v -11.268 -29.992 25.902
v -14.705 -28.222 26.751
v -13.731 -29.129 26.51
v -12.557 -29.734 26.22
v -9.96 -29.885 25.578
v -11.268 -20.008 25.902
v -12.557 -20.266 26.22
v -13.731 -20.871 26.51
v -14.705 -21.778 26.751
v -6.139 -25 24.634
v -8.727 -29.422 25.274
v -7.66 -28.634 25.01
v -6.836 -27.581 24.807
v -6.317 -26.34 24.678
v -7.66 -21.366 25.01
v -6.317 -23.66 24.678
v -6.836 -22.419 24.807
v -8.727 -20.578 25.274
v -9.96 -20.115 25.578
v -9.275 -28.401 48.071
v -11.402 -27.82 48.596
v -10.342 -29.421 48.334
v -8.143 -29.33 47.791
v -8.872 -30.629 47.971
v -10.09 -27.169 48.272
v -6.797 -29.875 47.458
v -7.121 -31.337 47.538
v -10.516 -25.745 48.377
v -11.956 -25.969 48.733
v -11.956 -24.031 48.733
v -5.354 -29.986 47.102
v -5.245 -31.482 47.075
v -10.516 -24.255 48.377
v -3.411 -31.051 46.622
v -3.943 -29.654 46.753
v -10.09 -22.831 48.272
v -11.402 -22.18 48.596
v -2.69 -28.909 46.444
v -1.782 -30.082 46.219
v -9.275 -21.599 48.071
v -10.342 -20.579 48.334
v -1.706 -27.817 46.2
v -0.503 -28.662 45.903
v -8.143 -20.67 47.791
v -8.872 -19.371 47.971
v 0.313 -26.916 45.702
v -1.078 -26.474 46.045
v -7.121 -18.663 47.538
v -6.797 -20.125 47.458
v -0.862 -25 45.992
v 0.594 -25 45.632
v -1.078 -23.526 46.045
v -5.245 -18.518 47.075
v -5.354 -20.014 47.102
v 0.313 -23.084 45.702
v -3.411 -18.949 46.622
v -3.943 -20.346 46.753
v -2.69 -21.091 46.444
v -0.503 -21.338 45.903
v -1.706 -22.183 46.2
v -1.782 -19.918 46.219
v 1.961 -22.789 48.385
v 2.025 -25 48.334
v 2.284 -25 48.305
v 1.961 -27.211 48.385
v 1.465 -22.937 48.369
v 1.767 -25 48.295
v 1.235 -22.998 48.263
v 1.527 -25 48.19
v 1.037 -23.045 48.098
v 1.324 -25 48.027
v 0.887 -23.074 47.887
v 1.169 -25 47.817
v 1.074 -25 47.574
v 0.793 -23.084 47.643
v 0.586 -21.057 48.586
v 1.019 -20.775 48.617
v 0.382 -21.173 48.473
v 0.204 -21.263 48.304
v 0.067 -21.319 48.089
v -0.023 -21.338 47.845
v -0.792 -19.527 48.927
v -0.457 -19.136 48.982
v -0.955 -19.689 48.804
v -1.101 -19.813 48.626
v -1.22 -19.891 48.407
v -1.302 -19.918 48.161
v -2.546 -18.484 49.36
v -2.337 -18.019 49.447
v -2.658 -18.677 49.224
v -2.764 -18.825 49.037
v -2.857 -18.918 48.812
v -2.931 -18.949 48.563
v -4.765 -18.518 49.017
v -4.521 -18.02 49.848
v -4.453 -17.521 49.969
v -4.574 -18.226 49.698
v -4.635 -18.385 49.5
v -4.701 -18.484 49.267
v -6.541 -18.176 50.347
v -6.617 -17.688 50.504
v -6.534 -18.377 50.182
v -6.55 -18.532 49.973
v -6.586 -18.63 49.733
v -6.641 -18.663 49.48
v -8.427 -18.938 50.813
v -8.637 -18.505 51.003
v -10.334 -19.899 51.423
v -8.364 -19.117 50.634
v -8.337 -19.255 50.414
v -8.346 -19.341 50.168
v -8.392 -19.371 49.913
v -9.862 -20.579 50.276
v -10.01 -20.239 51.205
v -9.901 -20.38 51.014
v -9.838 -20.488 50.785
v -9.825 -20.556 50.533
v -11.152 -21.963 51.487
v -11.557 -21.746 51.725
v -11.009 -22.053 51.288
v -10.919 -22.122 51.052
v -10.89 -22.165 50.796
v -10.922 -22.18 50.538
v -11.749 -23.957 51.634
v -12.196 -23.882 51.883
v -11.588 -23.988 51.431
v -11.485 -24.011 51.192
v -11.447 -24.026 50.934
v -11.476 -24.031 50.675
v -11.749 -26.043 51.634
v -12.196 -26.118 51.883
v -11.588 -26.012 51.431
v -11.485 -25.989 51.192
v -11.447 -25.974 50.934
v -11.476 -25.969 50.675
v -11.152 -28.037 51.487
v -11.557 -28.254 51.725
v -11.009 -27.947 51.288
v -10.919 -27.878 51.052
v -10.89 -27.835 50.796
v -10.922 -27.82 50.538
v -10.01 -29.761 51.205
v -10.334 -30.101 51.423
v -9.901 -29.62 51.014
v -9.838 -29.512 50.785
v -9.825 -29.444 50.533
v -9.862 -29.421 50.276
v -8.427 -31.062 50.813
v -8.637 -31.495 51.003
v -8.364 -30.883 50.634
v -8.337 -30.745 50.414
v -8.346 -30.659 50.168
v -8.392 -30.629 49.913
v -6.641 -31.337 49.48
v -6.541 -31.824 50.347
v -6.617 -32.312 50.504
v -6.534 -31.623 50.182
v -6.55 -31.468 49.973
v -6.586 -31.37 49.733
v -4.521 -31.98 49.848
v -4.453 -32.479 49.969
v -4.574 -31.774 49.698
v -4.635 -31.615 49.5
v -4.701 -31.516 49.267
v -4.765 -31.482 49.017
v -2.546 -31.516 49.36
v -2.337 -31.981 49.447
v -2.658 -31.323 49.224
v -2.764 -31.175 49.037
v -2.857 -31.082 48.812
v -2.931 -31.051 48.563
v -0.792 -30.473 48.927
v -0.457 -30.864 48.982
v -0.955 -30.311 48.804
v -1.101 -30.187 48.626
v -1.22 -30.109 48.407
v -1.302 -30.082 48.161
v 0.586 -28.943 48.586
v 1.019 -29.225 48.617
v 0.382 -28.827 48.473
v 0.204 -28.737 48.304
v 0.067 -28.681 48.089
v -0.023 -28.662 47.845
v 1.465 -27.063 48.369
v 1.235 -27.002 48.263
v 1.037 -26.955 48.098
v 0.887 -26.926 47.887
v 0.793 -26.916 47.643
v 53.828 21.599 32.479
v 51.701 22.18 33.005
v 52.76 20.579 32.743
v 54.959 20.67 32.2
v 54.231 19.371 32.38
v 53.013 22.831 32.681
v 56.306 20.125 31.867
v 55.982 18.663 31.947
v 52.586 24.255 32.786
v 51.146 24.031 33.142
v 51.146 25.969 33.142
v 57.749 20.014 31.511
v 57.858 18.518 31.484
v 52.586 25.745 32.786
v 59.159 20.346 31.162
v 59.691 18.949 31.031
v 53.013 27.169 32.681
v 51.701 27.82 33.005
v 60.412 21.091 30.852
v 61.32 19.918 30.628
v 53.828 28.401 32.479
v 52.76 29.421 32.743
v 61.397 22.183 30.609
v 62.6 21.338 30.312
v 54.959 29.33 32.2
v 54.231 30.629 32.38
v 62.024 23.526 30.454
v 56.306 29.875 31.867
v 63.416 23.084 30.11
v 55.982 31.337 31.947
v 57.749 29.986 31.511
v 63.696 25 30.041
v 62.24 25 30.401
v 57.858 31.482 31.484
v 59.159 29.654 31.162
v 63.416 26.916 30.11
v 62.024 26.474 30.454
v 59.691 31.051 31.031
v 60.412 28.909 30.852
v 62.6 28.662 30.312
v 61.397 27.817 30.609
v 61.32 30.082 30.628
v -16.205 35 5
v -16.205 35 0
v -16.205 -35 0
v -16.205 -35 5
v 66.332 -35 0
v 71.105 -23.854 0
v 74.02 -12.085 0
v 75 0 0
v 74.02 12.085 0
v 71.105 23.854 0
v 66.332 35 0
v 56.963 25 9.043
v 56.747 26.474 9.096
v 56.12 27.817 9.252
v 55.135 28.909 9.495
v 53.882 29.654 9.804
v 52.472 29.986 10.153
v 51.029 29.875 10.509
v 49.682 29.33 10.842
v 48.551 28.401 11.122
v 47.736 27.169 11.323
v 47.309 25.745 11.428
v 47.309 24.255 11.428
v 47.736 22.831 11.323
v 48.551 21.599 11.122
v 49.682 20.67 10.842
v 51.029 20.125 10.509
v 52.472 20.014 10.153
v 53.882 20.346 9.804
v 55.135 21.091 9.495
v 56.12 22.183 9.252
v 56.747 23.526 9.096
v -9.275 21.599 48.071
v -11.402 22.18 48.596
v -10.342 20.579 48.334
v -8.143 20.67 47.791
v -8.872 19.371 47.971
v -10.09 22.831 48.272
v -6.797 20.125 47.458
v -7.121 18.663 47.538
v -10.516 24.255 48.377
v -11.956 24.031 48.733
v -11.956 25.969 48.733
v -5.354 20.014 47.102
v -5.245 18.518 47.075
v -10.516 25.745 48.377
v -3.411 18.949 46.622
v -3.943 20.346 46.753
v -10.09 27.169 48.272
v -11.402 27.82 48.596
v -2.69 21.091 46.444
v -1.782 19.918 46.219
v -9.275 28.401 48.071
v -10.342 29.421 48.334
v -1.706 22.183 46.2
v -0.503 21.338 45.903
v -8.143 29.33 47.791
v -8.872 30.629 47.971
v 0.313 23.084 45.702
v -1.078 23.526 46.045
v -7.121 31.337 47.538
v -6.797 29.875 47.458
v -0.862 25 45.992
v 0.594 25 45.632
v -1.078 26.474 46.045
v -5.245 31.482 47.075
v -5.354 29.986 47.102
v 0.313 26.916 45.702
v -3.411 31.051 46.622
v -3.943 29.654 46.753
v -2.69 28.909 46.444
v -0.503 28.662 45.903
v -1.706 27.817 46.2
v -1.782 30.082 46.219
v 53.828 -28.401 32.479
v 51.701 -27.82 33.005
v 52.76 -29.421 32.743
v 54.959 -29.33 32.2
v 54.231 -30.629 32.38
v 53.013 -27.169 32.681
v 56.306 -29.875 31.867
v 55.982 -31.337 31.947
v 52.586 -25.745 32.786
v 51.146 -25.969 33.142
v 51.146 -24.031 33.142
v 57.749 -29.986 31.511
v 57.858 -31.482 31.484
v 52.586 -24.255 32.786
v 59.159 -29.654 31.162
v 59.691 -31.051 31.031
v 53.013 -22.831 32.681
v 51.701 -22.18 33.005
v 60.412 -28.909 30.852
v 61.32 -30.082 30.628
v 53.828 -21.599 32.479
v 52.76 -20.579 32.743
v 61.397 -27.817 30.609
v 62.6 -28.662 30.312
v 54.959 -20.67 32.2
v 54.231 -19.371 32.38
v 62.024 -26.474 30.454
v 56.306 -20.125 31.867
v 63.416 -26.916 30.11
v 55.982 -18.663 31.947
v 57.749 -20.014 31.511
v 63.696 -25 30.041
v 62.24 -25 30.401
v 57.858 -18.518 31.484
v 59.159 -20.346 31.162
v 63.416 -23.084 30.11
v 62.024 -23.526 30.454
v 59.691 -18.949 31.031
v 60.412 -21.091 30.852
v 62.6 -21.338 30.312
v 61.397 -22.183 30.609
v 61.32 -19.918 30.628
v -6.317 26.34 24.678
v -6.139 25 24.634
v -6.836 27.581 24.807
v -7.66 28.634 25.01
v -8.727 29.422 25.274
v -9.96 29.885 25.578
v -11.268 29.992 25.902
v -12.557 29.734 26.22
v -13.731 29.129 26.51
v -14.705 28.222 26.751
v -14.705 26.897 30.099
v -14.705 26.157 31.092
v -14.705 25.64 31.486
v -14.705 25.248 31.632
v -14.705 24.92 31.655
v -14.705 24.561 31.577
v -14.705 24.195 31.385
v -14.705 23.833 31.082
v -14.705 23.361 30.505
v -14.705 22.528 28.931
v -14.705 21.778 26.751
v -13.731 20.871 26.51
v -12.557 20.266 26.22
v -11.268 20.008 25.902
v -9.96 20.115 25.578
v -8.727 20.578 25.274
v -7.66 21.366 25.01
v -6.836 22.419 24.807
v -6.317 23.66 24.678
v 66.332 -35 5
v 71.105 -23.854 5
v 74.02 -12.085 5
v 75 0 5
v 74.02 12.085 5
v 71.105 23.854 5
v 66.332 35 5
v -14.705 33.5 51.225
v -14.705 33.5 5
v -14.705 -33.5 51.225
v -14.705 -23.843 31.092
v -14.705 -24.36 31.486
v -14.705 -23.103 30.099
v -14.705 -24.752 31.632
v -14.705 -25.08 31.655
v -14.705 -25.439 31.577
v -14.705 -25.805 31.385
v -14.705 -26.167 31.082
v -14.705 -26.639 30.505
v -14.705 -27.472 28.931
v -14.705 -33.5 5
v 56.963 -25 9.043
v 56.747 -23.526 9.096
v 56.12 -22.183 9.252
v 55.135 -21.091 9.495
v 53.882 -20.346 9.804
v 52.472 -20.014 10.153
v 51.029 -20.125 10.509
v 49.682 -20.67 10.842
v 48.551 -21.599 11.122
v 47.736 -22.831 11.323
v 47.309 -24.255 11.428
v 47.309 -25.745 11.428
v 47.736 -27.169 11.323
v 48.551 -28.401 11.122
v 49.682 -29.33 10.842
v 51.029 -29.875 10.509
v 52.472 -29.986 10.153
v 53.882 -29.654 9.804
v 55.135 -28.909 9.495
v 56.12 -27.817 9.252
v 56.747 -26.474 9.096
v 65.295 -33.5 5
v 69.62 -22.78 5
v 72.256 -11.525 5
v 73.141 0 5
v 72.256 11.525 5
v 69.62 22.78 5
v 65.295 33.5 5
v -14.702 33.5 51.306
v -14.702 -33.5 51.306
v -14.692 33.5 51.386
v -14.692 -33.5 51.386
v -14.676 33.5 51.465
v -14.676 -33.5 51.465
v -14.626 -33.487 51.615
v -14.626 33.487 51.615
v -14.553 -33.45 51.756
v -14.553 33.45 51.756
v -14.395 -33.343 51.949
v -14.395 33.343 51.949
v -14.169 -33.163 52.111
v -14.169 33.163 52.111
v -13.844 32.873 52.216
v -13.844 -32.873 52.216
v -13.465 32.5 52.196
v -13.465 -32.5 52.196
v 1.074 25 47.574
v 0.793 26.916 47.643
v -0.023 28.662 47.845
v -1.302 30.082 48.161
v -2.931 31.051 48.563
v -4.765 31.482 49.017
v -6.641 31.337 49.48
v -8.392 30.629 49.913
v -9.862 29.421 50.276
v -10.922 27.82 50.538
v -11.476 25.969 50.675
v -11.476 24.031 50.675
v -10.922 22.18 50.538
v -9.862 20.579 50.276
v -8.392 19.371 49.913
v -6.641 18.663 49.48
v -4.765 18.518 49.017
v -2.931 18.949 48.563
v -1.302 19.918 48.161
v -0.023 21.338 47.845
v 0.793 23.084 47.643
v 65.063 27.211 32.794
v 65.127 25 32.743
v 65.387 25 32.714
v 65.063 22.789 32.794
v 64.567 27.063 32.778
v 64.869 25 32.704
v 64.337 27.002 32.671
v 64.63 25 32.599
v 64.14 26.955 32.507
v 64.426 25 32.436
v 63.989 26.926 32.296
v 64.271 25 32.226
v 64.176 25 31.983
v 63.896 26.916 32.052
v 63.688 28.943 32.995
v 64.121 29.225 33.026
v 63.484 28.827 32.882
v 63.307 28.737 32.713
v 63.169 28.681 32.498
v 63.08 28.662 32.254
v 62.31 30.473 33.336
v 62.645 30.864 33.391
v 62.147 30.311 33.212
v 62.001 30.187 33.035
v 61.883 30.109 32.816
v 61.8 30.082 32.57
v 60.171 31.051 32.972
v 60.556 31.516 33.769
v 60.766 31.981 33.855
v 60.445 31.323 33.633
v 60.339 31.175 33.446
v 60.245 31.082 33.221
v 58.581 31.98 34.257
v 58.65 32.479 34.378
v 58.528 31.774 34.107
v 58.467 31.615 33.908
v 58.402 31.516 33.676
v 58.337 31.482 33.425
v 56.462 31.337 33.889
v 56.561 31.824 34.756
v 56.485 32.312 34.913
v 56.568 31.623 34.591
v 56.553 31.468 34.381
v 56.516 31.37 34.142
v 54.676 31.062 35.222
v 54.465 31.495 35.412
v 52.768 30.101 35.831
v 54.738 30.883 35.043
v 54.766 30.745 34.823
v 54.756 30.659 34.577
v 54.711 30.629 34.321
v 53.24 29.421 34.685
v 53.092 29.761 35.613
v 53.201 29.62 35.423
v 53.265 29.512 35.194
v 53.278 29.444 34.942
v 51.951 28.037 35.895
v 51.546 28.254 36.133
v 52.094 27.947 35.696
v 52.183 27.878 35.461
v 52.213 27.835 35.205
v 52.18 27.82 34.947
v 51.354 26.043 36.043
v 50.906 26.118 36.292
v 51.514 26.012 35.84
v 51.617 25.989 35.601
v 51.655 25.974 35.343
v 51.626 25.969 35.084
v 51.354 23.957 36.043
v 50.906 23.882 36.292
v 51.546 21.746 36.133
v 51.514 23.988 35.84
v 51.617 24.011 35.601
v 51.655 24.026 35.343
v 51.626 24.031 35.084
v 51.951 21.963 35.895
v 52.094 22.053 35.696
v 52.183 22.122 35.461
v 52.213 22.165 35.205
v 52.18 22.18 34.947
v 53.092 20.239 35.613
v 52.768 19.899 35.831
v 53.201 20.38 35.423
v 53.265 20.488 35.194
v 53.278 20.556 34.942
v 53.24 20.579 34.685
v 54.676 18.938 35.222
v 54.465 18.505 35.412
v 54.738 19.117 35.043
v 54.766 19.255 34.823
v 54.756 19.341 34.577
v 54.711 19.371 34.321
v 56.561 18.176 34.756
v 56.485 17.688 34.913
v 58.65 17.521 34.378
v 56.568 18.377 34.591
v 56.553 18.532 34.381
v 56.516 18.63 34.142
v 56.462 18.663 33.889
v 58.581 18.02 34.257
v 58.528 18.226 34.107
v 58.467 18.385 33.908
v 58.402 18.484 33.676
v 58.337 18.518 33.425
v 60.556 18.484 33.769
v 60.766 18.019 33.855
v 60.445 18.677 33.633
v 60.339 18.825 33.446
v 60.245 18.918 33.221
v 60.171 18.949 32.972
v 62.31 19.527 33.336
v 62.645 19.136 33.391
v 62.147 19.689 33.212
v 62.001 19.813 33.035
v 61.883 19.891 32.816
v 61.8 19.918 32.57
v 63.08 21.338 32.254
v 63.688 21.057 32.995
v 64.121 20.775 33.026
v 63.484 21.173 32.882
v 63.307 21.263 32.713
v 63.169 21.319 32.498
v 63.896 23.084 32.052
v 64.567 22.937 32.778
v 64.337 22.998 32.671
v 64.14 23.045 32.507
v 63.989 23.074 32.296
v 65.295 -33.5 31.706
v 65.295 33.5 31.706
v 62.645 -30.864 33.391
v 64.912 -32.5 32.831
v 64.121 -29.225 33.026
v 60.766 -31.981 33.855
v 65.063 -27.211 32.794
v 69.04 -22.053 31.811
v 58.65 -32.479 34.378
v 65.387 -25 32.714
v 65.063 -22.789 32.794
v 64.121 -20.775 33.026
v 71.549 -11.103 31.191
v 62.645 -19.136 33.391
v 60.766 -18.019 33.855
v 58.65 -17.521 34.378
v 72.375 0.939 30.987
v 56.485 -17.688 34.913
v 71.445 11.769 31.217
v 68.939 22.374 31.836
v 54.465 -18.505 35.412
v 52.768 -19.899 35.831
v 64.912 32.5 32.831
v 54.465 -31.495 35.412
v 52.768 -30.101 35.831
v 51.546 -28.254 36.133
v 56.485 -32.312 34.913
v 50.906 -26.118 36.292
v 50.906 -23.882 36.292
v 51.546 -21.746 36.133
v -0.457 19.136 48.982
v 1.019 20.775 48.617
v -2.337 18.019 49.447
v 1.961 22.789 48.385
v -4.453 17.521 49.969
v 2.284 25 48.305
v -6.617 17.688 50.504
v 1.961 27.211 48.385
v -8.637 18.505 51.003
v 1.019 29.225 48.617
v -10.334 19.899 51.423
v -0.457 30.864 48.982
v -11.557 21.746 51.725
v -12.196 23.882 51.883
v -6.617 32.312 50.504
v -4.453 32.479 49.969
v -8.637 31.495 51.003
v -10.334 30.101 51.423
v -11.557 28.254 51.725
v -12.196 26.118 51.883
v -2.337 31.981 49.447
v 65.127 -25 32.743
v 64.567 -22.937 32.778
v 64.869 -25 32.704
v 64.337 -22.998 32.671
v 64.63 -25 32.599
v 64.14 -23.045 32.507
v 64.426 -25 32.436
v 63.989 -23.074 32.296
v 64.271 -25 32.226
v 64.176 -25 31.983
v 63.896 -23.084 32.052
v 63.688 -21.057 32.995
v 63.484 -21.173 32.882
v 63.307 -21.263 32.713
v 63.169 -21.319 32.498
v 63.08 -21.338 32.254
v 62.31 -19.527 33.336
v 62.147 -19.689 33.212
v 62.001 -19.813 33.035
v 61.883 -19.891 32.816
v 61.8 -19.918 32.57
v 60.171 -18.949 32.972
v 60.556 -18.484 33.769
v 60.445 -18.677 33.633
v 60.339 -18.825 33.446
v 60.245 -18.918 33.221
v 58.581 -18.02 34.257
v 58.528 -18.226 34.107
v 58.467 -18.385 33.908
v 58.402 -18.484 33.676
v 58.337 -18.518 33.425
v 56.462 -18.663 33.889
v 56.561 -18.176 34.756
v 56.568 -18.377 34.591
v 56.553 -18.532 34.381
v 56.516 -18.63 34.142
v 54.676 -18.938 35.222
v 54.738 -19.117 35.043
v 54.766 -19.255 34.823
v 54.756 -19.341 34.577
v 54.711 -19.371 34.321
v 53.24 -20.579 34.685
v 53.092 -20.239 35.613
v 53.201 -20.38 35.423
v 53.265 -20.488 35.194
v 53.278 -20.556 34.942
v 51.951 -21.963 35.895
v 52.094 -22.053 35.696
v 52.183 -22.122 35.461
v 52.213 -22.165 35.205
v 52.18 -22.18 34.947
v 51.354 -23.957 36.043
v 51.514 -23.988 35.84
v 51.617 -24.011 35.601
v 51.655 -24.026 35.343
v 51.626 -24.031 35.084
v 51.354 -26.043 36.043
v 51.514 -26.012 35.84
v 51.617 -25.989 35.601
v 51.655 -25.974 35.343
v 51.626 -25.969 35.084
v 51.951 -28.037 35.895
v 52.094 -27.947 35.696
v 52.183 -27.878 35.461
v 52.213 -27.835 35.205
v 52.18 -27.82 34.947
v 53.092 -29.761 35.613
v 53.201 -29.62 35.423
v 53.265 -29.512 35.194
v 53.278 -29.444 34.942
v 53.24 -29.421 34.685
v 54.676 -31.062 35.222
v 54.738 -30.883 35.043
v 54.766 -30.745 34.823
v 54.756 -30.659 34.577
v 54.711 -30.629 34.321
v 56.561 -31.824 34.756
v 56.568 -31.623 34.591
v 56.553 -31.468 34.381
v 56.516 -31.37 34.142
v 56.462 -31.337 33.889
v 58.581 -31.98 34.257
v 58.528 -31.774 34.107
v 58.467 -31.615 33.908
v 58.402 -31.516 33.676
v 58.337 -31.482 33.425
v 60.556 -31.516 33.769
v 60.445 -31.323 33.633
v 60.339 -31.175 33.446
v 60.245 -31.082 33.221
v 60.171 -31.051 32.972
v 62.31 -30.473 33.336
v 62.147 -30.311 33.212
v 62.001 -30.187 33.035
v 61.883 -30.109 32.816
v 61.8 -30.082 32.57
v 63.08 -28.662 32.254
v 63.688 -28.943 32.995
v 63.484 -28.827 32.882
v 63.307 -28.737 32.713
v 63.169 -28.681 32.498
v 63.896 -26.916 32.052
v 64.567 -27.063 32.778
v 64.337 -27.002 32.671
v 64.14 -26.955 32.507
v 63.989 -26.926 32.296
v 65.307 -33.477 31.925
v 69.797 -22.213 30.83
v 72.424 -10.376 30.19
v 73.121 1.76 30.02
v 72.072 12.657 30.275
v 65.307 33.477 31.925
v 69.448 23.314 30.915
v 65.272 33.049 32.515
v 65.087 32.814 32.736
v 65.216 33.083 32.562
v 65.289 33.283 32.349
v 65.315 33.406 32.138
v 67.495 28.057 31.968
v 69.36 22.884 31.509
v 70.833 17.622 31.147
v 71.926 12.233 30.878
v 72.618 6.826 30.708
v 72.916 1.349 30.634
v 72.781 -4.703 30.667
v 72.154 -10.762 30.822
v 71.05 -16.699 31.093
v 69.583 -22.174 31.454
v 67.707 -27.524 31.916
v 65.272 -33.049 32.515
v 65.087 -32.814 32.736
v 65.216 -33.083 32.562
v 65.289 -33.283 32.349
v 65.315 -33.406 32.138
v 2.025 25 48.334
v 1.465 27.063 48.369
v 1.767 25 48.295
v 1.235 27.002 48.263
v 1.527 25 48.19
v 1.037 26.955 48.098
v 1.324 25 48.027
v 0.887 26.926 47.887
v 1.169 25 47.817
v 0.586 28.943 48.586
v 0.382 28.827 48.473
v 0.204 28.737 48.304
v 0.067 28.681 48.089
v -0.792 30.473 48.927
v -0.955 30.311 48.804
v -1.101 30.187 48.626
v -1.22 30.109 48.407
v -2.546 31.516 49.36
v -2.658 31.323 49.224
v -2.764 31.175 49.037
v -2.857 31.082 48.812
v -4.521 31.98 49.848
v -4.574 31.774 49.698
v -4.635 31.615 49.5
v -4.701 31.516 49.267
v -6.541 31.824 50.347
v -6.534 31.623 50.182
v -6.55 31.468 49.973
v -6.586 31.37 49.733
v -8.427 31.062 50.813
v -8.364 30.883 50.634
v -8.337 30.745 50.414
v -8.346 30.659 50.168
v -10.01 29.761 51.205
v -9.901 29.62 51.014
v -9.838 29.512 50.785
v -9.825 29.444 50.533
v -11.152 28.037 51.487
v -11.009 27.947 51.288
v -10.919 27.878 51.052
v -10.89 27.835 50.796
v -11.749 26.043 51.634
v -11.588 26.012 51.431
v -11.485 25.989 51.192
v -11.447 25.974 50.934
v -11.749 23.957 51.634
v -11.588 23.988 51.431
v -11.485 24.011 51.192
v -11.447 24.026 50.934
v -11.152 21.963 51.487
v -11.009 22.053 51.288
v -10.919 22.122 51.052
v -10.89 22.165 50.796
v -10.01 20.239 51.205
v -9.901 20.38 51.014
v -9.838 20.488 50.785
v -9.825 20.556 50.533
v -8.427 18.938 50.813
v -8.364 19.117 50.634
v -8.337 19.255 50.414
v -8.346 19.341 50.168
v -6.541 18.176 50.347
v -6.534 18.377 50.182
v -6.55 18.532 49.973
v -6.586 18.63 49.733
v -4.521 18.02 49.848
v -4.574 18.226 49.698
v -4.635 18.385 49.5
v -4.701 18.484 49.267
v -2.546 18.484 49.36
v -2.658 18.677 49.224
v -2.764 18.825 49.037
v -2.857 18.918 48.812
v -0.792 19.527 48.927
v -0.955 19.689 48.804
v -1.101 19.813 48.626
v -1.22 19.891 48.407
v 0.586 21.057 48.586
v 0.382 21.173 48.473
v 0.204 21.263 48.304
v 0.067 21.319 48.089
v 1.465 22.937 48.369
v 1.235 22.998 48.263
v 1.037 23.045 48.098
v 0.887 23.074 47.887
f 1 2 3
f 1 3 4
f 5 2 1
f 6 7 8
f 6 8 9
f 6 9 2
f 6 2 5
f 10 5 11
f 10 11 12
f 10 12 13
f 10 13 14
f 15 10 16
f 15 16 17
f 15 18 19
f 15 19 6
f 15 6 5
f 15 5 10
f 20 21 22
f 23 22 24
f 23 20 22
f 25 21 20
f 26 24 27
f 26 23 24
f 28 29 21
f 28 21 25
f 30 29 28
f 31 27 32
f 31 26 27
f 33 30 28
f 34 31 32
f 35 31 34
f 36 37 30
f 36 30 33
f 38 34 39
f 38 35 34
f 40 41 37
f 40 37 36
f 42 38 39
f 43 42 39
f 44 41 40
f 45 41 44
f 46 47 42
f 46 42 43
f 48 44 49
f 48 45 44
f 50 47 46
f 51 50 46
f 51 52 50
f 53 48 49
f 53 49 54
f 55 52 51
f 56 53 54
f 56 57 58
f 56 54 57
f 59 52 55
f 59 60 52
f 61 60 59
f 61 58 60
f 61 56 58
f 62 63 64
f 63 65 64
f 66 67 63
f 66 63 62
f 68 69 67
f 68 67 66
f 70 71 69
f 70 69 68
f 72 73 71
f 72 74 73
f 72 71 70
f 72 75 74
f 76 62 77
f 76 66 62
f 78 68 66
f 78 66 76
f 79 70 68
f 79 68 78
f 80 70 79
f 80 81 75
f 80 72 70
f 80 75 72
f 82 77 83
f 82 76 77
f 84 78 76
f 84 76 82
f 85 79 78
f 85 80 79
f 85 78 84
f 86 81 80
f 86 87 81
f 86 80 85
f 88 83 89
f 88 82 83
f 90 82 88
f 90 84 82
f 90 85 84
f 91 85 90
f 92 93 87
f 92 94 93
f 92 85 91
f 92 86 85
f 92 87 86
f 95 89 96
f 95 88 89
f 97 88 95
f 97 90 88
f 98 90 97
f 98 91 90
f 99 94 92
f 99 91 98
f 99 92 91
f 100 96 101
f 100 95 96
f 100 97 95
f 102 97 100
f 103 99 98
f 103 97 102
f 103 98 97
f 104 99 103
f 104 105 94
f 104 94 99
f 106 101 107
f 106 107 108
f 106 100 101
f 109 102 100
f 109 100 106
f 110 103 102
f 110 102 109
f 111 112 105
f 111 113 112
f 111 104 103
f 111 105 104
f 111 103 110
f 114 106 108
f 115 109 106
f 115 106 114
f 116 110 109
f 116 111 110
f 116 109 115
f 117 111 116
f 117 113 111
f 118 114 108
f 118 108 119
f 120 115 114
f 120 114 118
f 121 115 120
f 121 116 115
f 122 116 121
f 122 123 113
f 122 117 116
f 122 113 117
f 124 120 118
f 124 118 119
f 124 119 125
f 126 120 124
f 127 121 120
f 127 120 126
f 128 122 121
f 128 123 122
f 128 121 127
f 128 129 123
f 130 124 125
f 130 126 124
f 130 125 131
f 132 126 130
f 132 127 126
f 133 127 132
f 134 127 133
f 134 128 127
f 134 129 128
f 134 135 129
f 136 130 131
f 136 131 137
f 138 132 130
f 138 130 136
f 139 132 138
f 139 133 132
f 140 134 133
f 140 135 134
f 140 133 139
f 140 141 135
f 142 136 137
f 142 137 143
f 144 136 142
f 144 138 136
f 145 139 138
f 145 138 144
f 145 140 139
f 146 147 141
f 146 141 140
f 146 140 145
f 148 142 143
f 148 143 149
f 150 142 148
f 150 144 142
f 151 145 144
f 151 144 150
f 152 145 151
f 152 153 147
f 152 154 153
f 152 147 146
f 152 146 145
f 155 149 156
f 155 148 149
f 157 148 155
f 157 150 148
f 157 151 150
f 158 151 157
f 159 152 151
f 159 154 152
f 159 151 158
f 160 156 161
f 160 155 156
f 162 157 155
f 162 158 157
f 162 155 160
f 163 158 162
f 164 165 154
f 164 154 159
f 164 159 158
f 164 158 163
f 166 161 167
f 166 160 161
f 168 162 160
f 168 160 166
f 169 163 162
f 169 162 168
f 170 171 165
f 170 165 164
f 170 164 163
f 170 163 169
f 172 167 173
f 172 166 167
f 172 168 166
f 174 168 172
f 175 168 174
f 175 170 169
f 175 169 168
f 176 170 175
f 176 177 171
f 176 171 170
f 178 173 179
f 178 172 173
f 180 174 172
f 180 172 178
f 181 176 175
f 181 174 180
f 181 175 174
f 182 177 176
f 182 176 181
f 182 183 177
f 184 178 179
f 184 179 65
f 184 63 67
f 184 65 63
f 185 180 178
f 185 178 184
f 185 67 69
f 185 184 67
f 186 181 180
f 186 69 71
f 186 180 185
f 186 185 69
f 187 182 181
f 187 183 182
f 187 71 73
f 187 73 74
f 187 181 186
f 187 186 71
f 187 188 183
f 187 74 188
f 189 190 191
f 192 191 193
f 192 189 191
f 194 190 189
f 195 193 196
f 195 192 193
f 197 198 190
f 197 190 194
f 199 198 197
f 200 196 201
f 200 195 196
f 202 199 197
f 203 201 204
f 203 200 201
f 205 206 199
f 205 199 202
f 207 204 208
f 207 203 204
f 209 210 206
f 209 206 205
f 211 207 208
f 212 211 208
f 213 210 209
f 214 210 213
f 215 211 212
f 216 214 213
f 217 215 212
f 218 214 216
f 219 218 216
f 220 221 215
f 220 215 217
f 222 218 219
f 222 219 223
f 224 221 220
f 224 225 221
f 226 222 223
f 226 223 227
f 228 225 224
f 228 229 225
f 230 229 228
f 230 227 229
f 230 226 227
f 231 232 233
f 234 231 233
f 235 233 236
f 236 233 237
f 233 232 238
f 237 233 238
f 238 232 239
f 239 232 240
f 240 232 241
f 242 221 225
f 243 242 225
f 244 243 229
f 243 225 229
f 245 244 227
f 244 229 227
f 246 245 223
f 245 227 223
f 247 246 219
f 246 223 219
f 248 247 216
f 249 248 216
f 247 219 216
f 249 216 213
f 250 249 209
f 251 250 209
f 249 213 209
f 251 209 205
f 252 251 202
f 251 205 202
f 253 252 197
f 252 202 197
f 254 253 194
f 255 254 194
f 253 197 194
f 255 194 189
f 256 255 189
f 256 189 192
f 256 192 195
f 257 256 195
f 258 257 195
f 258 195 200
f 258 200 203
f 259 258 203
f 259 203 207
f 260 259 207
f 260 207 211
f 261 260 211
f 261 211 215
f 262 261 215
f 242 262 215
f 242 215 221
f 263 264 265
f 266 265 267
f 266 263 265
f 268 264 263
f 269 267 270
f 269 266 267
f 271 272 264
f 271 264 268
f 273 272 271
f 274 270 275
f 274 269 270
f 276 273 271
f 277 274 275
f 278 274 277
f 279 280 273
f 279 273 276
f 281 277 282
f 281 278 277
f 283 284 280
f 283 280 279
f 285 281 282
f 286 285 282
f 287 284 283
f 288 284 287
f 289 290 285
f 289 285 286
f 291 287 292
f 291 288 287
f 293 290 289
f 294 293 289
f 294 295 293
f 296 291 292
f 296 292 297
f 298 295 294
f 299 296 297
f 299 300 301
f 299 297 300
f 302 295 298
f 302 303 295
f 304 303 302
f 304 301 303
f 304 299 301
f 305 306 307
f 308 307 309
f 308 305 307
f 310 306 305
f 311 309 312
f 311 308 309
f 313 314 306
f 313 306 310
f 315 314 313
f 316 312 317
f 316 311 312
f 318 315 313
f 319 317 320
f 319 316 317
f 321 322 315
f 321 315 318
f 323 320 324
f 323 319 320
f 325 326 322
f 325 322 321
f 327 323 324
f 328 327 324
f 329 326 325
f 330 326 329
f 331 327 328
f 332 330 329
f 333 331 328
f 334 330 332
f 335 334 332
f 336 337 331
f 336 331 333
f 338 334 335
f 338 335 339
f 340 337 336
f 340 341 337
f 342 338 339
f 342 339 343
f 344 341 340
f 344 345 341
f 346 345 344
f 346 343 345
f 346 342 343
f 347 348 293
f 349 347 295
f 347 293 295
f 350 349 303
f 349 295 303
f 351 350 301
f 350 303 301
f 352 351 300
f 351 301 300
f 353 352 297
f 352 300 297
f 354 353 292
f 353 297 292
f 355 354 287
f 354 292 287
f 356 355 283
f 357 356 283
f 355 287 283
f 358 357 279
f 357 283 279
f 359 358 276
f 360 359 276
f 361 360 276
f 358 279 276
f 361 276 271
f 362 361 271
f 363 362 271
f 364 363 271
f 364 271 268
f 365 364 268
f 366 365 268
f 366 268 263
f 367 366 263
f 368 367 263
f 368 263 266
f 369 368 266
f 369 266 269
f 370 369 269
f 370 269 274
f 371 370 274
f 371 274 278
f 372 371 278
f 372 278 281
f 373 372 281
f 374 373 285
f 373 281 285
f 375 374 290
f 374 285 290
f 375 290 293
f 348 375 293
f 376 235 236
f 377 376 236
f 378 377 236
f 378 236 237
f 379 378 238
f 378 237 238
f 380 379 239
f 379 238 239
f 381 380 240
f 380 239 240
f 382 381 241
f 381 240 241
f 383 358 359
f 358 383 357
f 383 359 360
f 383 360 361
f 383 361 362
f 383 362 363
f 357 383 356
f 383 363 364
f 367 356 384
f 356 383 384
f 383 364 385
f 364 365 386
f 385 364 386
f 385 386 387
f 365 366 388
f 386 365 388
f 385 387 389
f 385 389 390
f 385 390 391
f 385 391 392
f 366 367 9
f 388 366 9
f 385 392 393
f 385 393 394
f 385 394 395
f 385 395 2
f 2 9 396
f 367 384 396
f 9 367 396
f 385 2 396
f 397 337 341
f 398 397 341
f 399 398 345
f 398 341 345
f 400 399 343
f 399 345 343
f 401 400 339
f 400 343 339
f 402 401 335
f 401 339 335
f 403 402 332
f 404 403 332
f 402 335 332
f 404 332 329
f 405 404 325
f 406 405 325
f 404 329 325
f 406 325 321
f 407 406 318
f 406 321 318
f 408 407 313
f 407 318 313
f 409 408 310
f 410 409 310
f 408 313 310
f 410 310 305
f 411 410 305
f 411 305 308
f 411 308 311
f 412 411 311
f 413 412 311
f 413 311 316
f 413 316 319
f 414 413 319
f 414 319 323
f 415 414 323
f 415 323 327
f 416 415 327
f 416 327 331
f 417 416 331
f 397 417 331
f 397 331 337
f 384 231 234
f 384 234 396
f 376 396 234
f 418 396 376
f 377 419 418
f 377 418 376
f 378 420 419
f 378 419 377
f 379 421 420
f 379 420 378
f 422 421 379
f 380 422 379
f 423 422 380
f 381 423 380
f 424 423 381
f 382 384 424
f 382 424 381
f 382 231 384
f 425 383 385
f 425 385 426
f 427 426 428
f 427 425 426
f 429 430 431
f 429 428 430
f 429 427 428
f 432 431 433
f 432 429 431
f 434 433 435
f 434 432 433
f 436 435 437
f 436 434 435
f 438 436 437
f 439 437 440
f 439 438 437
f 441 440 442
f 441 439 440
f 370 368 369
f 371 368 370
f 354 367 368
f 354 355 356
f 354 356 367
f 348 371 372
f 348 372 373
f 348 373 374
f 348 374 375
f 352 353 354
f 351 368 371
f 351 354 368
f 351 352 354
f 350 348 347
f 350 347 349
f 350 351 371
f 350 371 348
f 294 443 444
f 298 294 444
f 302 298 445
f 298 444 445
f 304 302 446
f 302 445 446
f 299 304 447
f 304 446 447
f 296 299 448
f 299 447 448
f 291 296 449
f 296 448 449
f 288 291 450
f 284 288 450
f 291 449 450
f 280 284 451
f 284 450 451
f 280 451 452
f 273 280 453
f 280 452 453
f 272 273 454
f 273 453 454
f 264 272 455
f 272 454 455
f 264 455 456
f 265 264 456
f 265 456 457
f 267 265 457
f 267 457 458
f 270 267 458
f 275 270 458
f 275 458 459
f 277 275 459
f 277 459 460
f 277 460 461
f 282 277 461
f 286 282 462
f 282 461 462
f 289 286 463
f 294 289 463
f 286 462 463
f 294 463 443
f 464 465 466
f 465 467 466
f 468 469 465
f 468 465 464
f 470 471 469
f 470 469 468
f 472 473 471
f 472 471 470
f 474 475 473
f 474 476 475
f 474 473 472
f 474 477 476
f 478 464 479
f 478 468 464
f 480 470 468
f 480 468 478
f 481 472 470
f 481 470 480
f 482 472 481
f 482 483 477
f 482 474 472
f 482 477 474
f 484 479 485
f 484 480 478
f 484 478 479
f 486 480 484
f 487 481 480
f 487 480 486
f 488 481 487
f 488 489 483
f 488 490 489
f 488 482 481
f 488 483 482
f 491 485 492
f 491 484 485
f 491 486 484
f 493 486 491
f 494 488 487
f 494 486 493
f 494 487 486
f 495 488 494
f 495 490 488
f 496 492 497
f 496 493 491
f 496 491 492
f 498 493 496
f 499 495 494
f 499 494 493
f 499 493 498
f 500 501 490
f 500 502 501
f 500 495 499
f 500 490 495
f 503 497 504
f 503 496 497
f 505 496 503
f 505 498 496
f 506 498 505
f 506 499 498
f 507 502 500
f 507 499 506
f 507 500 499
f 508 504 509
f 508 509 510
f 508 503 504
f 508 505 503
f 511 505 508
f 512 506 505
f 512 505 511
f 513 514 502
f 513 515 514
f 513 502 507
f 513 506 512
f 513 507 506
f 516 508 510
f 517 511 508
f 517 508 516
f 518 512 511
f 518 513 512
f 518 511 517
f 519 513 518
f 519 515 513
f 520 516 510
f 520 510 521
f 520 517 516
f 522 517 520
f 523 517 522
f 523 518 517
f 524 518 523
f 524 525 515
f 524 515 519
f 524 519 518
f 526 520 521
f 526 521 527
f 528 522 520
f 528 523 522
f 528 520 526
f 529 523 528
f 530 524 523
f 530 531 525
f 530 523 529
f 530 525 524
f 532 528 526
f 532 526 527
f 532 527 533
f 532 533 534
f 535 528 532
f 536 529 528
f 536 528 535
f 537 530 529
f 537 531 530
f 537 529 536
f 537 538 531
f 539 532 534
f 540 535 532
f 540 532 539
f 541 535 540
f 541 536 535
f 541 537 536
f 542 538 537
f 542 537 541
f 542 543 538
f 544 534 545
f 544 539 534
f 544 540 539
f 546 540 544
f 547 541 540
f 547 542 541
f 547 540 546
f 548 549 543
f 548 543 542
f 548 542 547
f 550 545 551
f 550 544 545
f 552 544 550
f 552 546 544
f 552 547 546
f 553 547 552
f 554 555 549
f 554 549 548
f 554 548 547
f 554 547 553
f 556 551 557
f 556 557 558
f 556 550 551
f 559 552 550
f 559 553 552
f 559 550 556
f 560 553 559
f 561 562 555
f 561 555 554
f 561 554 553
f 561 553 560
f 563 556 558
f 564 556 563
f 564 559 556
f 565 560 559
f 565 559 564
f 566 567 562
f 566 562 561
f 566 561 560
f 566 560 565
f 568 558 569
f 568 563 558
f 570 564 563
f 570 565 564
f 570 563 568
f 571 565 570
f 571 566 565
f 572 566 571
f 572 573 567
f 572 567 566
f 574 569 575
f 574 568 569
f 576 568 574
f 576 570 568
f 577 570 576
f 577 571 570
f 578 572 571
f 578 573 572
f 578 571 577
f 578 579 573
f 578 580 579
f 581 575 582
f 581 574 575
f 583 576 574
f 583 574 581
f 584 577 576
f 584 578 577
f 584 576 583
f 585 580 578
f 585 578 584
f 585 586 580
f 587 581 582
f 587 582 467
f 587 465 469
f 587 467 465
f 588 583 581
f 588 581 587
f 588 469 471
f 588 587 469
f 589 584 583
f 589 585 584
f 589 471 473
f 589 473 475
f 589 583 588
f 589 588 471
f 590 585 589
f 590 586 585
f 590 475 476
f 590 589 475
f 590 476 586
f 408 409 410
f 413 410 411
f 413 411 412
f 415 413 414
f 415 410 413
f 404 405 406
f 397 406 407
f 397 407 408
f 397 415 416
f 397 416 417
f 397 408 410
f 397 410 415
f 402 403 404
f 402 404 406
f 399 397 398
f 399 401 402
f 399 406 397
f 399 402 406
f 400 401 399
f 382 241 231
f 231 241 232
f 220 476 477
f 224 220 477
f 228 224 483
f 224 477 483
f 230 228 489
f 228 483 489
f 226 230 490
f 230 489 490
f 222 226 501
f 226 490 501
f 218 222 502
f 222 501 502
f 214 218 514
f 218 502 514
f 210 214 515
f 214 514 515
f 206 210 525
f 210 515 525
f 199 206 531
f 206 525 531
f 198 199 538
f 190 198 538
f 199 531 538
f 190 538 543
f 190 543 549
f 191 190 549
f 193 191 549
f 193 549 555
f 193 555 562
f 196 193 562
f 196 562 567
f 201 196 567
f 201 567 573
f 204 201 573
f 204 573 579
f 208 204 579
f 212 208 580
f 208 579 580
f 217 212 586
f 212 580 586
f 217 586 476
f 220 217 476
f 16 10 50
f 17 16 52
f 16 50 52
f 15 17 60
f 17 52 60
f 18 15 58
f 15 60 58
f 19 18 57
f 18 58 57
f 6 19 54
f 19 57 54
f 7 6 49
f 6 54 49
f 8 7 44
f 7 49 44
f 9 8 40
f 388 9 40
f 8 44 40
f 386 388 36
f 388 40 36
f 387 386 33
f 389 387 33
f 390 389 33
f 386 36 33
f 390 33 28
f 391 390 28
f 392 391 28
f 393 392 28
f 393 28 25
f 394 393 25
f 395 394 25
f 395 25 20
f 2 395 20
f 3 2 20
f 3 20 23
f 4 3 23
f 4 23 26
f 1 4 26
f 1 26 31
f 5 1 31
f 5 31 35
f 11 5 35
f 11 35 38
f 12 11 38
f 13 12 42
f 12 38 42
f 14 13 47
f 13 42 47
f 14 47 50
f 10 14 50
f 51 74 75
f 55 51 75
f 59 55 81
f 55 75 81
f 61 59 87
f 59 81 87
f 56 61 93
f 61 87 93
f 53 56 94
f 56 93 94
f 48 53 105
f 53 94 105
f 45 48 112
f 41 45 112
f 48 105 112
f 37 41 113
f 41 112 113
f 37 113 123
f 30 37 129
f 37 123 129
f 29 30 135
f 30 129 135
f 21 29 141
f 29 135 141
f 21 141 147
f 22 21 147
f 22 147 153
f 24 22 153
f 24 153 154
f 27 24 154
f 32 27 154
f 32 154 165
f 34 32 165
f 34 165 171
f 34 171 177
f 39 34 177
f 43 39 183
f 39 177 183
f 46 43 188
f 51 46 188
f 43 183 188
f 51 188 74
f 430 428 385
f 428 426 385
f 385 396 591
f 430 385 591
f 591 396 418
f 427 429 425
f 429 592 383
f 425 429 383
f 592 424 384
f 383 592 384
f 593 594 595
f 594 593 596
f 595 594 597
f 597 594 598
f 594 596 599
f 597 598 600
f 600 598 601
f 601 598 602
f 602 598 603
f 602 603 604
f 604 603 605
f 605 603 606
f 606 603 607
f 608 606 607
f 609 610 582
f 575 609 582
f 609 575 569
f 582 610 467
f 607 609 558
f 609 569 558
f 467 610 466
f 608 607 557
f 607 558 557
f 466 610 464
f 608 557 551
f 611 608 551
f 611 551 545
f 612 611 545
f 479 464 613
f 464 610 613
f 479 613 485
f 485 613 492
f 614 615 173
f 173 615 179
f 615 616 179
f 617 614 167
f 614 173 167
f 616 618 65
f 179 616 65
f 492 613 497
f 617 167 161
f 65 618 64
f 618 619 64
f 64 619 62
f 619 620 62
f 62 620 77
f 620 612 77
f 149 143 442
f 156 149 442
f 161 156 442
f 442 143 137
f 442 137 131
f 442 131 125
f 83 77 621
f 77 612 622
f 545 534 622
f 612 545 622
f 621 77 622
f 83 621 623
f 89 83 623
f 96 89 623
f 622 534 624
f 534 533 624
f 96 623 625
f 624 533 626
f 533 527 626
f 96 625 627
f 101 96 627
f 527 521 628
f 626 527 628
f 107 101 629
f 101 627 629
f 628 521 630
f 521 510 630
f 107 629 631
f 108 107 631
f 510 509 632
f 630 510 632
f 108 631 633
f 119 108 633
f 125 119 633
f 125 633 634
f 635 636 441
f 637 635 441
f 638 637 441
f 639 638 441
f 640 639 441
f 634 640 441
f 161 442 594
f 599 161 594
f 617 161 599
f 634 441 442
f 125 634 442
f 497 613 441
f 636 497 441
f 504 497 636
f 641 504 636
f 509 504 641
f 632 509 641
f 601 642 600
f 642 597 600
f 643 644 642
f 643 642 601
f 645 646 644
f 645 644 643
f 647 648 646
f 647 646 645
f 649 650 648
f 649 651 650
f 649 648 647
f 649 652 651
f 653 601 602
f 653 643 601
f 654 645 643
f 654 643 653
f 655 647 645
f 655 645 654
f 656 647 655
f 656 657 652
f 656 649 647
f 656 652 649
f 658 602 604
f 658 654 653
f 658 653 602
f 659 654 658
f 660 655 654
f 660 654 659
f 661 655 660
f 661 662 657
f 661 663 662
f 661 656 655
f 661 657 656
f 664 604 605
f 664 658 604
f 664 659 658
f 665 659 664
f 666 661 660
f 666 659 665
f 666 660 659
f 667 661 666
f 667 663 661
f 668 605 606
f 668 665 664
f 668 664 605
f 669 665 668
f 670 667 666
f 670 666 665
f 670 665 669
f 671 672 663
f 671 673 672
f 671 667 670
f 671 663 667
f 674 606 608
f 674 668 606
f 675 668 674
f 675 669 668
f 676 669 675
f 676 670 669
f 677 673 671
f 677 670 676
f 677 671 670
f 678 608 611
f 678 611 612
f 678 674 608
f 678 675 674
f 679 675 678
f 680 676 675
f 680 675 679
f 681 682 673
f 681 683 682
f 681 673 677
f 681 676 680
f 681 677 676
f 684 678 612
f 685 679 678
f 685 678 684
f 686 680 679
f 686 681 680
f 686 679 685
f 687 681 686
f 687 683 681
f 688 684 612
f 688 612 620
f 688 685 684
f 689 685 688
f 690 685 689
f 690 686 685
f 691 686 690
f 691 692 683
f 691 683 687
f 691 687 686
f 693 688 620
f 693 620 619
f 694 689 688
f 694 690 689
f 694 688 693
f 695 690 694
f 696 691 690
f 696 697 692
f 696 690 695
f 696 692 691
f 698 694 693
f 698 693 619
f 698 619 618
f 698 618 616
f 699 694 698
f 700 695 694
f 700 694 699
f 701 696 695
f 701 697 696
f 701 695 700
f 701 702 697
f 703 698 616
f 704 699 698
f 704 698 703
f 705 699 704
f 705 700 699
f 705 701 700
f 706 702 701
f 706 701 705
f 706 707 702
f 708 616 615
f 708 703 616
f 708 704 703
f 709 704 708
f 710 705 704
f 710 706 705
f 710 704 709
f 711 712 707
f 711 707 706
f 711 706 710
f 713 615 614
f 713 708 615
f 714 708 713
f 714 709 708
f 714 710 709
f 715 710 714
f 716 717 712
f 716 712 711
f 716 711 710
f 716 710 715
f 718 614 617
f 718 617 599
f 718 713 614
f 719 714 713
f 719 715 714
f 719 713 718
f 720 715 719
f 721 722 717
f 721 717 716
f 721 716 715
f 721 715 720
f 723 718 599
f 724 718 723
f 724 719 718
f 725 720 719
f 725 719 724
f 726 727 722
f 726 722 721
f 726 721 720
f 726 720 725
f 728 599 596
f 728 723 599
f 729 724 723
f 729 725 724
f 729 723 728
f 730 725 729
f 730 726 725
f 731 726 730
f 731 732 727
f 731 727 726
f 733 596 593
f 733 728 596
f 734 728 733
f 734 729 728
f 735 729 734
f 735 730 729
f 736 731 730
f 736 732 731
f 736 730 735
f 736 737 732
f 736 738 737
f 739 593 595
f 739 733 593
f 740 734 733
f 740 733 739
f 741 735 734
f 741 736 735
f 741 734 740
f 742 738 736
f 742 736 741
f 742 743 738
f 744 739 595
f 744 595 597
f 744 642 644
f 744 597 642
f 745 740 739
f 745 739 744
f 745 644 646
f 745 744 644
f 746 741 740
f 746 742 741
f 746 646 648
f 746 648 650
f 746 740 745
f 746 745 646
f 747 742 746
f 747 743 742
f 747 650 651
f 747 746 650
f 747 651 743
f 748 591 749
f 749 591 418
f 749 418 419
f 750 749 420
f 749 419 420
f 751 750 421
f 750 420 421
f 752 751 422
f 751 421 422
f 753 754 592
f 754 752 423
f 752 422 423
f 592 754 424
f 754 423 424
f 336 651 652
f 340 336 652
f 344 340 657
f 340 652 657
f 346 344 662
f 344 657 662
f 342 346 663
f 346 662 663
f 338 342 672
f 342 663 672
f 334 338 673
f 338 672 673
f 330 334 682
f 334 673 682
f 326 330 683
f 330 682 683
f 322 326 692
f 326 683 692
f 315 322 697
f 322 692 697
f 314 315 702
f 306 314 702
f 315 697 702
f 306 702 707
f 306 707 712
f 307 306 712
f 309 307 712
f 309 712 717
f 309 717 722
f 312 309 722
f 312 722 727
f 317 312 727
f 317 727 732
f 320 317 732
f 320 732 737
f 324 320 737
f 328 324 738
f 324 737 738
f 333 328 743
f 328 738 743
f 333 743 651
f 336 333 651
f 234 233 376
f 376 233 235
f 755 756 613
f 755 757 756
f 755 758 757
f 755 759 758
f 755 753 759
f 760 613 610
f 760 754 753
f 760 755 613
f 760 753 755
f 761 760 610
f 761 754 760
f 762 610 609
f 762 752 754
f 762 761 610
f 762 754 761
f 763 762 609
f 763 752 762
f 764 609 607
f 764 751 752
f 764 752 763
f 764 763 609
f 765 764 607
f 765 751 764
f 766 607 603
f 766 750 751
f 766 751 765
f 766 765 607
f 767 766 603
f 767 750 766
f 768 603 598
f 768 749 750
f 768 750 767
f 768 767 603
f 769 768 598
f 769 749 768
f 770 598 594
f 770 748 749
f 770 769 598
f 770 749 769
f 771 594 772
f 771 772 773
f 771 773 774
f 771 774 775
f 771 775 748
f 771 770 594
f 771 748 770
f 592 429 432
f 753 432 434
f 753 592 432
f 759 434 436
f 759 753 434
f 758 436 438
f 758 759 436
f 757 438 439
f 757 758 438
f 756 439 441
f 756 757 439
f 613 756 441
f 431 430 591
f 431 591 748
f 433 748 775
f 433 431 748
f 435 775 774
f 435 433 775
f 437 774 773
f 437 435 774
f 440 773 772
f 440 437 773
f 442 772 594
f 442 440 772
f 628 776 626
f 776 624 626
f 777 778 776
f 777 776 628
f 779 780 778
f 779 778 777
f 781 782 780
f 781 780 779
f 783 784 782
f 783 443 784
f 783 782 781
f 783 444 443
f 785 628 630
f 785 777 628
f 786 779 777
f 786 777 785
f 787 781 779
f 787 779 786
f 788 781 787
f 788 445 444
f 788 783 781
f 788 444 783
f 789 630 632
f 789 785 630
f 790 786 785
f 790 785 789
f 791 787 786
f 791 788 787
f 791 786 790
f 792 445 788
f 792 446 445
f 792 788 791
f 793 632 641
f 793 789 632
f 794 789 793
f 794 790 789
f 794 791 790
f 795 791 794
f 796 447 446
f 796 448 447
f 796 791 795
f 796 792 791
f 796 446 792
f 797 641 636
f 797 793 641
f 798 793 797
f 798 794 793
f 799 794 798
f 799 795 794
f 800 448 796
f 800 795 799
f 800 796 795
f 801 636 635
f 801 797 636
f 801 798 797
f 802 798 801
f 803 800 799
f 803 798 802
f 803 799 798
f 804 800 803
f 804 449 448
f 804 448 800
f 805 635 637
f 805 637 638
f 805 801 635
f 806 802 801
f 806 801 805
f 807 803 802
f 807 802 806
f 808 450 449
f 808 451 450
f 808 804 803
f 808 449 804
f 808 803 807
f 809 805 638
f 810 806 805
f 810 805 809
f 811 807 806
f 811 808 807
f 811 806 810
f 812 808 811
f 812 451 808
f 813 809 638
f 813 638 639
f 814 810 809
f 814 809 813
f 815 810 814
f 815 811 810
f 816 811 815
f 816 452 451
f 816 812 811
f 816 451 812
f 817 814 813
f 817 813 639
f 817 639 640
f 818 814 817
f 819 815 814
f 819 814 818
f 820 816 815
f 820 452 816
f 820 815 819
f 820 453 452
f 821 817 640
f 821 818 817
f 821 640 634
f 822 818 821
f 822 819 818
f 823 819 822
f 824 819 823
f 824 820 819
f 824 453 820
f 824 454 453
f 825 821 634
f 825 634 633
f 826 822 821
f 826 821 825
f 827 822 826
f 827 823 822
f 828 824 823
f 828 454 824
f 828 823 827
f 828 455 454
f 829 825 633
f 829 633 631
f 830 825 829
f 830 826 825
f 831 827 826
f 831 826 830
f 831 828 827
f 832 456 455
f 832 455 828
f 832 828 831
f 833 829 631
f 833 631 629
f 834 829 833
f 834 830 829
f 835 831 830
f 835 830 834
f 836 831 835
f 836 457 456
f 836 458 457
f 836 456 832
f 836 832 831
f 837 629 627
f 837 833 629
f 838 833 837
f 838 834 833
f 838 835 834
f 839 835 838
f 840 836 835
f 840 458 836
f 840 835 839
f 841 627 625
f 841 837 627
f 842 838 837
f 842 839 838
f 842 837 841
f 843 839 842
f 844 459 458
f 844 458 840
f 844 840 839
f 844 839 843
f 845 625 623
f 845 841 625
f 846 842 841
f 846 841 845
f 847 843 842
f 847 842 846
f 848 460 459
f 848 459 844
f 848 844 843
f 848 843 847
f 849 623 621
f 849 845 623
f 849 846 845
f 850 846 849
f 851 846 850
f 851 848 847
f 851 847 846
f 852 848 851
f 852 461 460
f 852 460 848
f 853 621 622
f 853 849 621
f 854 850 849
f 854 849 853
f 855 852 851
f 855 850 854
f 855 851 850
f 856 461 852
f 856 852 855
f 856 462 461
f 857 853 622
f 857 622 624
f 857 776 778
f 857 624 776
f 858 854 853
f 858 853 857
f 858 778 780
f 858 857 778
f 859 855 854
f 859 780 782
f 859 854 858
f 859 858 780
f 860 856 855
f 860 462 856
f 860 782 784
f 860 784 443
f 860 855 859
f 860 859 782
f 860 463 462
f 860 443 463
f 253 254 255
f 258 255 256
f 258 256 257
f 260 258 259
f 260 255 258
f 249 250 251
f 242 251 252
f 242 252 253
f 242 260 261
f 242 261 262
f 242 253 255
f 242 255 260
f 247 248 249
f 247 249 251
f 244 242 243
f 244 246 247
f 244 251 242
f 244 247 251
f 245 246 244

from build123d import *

# Parameters (mm, degrees)
BOSS_EXTRUDE1_DEPTH = 5
BOSS_EXTRUDE2_REACH = 84.916
SKETCH3_R           = 5
CUT_EXTRUDE1_DEPTH  = 25
SKETCH4_R           = 6.5
CUT_EXTRUDE2_DEPTH  = 3
FILLET1_R           = 1


with BuildPart() as part:
    # Sketch1 → Boss-Extrude1 (new body)
    with BuildSketch(Plane.XY):
        with BuildLine():
            Line((-16.204881352, 35), (-16.204881352, -35))
            Line((-16.204881352, -35), (66.332495807, -35))
            ThreePointArc((66.332495807, -35), (75, 0), (66.332495807, 35))
            Line((66.332495807, 35), (-16.204881352, 35))
        make_face()
    extrude(amount=BOSS_EXTRUDE1_DEPTH)

    # Boss-Extrude2: up to this plane
    boss_extrude2_end = Plane(origin=(7.525658293, -40, 47.009794297), z_dir=(-0.239863978039186, 0, -0.9708065059728519))
    # Sketch2 → Boss-Extrude2 (add, up to the surface)
    with BuildSketch(Plane.XY.offset(5), mode=Mode.PRIVATE) as boss_extrude2_sk1:
        with BuildLine():
            Line((65.295118648, 33.5), (-14.704881352, 33.5))
            Line((-14.704881352, 33.5), (-14.704881352, -33.5))
            Line((-14.704881352, -33.5), (65.295118648, -33.5))
            ThreePointArc((65.295118648, -33.5), (73.141235595, 0), (65.295118648, 33.5))
        make_face()
    boss_extrude2_tool1 = split(extrude(boss_extrude2_sk1.sketch, amount=BOSS_EXTRUDE2_REACH, mode=Mode.PRIVATE), bisect_by=boss_extrude2_end, keep=Keep.BOTH, mode=Mode.PRIVATE)
    add(boss_extrude2_tool1.solids().sort_by_distance((27.970522, 0, 5))[0])

    # Sketch3 → Cut-Extrude1 (cut)
    with BuildSketch(Plane(origin=(11.379758408, 0, 46.057534728), x_dir=(0.970806505972852, 0, -0.23986397803918558), z_dir=(0.2398639780391856, 0, 0.9708065059728521))):
        with Locations((-16.869040946, 25)):
            Circle(SKETCH3_R)
        with Locations((-16.869040946, -25)):
            Circle(SKETCH3_R)
        with Locations((48.130959054, -25)):
            Circle(SKETCH3_R)
        with Locations((48.130959054, 25)):
            Circle(SKETCH3_R)
    extrude(amount=-CUT_EXTRUDE1_DEPTH, mode=Mode.SUBTRACT)

    # Sketch4 → Cut-Extrude2 (cut)
    with BuildSketch(Plane(origin=(11.379758408, 0, 46.057534728), x_dir=(0.970806505972852, 0, -0.23986397803918558), z_dir=(0.2398639780391856, 0, 0.9708065059728521))):
        with Locations((-16.869040946, 25)):
            Circle(SKETCH4_R)
        with Locations((-16.869040946, -25)):
            Circle(SKETCH4_R)
        with Locations((48.130959054, -25)):
            Circle(SKETCH4_R)
        with Locations((48.130959054, 25)):
            Circle(SKETCH4_R)
    extrude(amount=-CUT_EXTRUDE2_DEPTH, mode=Mode.SUBTRACT)

    # Fillet1
    fillet1_edges = [part.edges().sort_by_distance(p)[0] for p in [
        (25.295118648, -33.5, 42.619368994),
        (-14.704881352, 0, 52.502449775),
        (25.295118648, 33.5, 42.619368994),
        (73.141235595, 0, 30.797693023),
        (-11.307058581, 25, 51.662925852),
        (51.795364307, 25, 36.07176728),
        (51.795364307, -25, 36.07176728),
        (-11.307058581, -25, 51.662925852),
    ]]
    fillet(fillet1_edges, radius=FILLET1_R - 0.0001)  # a hair under: the kernel refuses the full size


solid = part.part
